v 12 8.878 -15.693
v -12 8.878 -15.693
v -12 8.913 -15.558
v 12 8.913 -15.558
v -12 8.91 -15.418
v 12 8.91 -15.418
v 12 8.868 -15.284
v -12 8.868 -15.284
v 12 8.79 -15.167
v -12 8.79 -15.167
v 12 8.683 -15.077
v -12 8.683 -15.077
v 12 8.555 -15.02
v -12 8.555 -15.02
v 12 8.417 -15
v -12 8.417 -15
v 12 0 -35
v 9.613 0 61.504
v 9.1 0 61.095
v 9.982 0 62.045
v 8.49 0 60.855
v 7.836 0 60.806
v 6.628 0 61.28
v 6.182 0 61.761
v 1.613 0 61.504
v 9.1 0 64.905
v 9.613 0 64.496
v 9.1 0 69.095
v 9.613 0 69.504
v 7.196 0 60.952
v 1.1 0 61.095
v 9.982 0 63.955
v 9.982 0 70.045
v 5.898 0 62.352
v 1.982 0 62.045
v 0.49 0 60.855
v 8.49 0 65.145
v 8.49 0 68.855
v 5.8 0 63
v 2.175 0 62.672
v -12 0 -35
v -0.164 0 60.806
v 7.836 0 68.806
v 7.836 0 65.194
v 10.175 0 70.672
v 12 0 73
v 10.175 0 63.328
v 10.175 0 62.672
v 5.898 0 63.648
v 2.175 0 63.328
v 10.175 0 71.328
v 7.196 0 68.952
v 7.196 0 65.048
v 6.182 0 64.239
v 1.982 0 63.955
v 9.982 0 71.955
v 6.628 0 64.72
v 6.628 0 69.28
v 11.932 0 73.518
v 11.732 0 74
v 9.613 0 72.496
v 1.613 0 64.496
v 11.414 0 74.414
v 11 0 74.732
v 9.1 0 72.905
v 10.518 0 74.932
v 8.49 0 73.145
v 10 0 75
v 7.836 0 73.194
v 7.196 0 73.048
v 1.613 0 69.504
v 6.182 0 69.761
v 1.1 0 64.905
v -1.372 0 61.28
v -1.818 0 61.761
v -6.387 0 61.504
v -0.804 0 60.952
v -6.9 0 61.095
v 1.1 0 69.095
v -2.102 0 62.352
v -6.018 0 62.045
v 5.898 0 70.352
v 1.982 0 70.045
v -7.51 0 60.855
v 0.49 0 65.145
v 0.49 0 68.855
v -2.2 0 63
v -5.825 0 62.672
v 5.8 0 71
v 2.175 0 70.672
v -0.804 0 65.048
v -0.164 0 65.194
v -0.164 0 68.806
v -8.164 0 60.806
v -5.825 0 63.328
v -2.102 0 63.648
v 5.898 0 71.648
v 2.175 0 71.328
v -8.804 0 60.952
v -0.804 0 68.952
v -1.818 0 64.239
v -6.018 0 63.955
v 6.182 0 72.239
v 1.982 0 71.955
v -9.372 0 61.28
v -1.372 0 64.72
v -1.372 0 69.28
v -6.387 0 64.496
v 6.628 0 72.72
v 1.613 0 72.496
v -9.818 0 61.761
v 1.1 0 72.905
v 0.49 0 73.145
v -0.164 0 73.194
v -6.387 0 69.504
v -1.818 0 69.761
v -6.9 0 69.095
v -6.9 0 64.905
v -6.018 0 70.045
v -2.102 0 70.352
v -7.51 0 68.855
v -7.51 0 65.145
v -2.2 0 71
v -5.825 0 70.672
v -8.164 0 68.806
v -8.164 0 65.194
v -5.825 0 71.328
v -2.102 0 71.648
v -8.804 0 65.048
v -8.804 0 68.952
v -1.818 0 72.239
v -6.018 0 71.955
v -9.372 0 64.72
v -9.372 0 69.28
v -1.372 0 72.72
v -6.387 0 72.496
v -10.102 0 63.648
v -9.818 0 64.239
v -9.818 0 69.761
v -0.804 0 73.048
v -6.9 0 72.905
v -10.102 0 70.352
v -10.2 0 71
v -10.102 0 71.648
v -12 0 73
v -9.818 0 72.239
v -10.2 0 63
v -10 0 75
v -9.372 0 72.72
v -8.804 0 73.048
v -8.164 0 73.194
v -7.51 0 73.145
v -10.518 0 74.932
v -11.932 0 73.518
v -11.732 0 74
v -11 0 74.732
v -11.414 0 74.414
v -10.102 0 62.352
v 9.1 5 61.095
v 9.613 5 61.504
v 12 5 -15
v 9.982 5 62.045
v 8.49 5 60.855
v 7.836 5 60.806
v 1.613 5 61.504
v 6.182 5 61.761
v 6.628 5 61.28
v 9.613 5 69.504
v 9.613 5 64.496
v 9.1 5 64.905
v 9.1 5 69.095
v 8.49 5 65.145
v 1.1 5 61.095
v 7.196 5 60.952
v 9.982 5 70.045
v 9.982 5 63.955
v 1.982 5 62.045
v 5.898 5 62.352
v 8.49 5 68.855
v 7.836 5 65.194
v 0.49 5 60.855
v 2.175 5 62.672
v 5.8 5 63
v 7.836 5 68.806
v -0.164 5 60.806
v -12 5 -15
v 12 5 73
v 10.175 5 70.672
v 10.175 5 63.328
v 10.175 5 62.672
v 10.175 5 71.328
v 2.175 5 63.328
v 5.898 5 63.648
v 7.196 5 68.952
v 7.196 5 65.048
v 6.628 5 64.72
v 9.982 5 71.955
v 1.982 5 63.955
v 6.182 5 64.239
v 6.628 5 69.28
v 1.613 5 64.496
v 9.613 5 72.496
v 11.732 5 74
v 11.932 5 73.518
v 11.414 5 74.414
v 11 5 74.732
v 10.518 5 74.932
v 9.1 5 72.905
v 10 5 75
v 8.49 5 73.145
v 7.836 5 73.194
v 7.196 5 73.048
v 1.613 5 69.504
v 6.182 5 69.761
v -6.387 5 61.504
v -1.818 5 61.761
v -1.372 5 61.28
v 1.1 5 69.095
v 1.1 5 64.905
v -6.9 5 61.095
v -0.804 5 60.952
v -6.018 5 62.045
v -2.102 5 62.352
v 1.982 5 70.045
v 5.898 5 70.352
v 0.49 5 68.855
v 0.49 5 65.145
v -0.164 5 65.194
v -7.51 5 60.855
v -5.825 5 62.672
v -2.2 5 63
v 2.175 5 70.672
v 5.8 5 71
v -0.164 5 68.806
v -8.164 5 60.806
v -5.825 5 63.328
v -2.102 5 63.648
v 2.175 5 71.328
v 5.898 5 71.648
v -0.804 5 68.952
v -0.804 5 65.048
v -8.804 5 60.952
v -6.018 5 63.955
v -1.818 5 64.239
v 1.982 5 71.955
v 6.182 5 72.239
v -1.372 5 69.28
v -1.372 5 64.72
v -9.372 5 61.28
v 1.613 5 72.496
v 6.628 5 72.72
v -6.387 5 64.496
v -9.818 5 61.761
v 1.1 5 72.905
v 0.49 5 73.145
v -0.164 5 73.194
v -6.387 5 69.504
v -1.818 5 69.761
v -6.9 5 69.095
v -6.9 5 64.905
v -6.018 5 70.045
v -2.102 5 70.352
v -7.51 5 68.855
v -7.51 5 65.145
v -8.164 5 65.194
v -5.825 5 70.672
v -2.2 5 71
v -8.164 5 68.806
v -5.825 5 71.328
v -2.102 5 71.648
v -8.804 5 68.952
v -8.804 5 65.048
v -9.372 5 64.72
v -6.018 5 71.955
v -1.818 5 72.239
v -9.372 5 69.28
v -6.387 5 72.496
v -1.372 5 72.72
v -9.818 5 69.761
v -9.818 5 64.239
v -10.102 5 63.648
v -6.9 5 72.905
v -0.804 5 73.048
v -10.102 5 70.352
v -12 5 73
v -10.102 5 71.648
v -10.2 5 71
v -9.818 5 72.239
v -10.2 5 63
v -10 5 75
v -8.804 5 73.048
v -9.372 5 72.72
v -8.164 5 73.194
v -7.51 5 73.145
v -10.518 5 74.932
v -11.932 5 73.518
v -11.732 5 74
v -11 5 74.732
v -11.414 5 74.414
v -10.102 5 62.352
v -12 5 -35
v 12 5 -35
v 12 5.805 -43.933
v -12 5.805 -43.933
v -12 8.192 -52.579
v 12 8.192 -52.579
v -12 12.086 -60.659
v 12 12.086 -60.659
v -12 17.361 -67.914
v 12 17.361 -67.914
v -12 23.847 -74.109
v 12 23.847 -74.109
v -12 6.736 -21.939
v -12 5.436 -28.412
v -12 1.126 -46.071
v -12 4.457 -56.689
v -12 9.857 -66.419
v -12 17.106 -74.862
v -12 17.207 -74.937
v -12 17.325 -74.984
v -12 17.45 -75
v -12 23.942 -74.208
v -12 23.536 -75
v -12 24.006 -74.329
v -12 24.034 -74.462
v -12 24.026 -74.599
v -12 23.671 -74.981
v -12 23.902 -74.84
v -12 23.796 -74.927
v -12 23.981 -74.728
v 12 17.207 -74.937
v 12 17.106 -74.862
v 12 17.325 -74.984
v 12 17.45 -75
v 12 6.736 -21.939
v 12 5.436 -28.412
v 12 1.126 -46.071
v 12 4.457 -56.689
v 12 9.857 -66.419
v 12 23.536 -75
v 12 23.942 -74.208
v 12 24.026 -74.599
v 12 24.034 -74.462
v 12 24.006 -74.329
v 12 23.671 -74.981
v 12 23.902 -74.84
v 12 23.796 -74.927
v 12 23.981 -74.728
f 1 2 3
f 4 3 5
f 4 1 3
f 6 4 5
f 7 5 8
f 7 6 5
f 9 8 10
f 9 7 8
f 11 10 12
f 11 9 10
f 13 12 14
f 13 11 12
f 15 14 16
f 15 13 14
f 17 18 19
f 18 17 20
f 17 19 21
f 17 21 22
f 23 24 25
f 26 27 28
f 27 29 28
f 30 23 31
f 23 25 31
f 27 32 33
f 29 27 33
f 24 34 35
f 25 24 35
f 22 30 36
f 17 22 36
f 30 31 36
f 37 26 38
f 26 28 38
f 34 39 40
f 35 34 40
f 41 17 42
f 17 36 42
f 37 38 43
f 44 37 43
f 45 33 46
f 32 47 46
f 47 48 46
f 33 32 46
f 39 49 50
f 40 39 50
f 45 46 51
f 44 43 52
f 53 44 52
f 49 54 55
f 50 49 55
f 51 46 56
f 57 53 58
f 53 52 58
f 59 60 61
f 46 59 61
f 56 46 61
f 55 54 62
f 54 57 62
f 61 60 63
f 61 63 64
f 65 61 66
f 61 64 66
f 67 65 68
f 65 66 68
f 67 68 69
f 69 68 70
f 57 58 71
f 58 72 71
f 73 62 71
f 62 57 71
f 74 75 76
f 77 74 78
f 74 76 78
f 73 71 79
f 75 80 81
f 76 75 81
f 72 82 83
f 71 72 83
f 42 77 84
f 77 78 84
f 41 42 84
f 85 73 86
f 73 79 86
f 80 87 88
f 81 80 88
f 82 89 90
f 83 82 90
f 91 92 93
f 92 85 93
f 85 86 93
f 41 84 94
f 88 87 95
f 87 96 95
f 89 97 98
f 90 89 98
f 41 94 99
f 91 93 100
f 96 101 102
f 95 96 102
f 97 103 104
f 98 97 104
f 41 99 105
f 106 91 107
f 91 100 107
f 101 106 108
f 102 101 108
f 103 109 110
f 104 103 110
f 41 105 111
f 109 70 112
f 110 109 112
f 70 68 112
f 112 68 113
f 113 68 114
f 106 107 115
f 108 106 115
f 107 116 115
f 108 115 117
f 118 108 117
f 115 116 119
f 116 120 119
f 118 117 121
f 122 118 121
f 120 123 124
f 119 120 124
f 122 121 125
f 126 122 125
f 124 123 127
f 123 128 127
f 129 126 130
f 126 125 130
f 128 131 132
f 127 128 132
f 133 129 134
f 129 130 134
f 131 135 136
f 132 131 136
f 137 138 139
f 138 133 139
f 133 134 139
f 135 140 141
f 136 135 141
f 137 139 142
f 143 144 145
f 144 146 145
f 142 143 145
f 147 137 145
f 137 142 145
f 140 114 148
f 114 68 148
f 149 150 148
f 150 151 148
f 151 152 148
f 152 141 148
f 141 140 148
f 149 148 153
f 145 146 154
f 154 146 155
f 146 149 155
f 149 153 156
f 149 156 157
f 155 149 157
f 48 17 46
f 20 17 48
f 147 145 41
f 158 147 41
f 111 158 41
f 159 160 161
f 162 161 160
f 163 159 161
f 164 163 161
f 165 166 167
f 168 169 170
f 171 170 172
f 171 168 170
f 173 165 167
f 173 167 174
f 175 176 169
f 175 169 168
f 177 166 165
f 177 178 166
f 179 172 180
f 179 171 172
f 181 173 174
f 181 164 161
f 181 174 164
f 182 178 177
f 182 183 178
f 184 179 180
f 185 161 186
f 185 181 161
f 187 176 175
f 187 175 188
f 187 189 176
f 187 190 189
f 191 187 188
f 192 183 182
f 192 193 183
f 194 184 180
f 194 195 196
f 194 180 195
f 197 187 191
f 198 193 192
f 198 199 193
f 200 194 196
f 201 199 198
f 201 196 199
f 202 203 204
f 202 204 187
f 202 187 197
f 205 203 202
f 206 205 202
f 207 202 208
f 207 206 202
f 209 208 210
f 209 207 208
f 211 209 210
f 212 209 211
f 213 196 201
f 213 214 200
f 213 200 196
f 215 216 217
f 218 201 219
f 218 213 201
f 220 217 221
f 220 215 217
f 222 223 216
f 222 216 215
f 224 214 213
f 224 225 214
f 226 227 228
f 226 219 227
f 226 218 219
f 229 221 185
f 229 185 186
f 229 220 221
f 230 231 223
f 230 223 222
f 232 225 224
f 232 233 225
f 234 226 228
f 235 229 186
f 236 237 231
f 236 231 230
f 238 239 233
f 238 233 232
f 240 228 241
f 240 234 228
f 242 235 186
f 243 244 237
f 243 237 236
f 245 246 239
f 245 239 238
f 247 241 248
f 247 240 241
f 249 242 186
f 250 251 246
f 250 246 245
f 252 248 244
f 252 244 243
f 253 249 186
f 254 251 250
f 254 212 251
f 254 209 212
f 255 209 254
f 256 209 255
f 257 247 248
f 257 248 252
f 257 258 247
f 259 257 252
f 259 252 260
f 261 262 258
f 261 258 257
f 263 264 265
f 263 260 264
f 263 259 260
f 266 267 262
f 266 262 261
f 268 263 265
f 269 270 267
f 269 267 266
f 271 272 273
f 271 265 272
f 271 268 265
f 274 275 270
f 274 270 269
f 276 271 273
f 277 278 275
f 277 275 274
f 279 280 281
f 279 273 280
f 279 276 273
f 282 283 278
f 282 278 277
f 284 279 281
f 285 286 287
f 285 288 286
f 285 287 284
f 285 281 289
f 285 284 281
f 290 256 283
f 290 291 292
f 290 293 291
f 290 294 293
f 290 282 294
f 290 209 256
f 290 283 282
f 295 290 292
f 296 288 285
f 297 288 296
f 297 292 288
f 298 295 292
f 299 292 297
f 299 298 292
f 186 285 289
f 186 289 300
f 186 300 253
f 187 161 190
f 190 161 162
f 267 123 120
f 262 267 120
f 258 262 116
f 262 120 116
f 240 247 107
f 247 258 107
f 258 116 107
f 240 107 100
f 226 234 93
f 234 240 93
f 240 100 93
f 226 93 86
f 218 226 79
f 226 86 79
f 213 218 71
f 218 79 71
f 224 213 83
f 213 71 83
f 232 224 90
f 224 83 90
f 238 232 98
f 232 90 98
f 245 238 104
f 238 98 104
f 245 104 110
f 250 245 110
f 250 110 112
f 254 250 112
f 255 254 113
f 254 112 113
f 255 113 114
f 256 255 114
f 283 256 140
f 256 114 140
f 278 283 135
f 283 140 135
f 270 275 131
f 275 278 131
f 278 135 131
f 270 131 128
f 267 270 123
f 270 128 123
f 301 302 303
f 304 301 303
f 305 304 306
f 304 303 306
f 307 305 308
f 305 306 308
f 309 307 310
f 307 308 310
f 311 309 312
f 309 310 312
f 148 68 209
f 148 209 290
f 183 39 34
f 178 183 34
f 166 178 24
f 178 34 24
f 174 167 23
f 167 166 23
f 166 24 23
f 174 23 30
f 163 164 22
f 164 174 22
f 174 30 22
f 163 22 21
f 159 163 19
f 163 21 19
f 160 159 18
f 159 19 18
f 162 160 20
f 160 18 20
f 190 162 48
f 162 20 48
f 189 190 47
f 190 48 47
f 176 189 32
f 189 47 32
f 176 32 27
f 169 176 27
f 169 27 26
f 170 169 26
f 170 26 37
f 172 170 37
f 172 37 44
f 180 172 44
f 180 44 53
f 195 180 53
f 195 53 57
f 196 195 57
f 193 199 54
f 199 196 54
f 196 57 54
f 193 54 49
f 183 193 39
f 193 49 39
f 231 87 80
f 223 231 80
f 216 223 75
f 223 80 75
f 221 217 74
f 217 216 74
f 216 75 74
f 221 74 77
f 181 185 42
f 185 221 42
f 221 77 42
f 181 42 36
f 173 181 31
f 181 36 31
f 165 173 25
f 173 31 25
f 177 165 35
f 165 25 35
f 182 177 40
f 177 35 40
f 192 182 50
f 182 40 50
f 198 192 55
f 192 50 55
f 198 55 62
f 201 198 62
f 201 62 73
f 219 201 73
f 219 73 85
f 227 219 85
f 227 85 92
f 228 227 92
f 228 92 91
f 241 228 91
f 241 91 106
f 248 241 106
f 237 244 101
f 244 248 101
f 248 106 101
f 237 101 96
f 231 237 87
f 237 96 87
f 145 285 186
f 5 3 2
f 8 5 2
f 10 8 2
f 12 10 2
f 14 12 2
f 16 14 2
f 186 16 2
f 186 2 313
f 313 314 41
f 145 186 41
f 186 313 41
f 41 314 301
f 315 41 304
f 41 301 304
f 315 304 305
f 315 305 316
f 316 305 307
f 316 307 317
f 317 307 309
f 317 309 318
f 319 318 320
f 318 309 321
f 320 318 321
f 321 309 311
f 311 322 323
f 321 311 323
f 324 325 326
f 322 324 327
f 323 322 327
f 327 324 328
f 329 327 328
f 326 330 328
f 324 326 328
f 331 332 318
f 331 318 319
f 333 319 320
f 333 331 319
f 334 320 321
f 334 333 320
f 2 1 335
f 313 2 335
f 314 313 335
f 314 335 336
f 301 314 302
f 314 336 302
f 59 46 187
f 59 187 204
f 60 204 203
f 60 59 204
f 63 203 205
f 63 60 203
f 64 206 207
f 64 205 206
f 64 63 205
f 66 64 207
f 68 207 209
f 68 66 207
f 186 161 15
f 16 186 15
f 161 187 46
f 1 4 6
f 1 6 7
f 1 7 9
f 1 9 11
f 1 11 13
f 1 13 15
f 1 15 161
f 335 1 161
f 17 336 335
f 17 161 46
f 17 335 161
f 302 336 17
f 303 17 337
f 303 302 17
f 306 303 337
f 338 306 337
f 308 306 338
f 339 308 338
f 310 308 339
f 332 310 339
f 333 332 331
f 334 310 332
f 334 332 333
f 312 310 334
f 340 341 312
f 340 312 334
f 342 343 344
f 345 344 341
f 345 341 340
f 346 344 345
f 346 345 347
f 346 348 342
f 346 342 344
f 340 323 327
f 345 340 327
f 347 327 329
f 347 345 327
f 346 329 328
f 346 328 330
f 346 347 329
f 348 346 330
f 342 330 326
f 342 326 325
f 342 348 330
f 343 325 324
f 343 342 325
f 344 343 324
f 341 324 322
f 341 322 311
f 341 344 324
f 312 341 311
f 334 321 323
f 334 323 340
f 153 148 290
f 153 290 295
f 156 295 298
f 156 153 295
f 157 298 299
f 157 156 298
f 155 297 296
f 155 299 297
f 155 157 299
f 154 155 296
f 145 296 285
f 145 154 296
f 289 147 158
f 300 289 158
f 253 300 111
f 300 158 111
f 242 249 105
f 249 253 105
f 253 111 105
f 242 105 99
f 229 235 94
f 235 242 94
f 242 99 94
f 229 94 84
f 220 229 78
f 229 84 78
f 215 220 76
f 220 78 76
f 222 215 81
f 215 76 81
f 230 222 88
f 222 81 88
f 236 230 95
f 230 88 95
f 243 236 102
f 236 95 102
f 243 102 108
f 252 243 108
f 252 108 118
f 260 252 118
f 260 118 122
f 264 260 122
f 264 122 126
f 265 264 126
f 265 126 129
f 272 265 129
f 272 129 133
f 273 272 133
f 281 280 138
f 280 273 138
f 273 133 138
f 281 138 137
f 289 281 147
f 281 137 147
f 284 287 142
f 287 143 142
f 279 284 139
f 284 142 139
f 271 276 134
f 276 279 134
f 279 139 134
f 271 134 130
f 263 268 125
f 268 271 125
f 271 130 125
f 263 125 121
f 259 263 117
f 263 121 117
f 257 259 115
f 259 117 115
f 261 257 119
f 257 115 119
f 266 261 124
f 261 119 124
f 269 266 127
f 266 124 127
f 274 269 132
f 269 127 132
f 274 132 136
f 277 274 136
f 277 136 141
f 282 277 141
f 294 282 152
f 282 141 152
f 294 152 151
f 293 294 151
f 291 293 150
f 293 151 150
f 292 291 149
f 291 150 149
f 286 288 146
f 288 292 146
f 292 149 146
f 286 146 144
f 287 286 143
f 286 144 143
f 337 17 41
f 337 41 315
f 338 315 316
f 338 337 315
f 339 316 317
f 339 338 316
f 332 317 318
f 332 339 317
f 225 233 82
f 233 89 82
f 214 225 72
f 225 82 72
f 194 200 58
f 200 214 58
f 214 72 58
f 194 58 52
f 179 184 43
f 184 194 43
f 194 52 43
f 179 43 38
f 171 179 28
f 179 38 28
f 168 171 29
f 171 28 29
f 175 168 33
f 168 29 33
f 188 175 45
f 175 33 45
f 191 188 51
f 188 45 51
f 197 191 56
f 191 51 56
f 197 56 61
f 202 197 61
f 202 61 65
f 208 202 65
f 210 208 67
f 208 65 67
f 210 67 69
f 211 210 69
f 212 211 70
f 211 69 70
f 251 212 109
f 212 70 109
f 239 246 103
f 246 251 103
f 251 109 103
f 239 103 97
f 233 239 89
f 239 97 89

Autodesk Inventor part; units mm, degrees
ref_plane "YZ Plane" through (0, 0, 0) normal (1, 0, 0) x (0, 1, 0)
ref_plane "XZ Plane" through (0, 0, 0) normal (0, 1, 0) x (-1, 0, 0)
ref_plane "XY Plane" through (0, 0, 0) normal (0, 0, 1) x (1, 0, 0)
sketch "Sketch1" plane through (0, 0, 0) normal (0, 1, 0) x (-1, 0, 0)
  line L0 (-10, 75) -> (10, 75)
  line L1 (12, 73) -> (12, -75)
  line L2 (12, -75) -> (-12, -75)
  line L3 (-12, -75) -> (-12, 73)
  line L4 (-12, 75) -> (12, -75) construction
  line L5 (12, 75) -> (-12, -75) construction
  arc A0 (12, 73) -> (10, 75) centre (10, 73) ccw
  arc A1 (-10, 75) -> (-12, 73) centre (-10, 73) ccw
  circle A2 centre (8, 71) radius 2.2
  circle A3 centre (0, 71) radius 2.2
  circle A4 centre (-8, 71) radius 2.2
  circle A5 centre (8, 63) radius 2.2
  circle A6 centre (0, 63) radius 2.2
  circle A7 centre (-8, 63) radius 2.2
  point P0 (0, 0)
  dimension "d0" = 24
  dimension "d1" = 150
  dimension "d2" = 2
  dimension "d3" = 4.4
  dimension "d4" = 4
  dimension "d5" = 4
  dimension "d8" = 8
  dimension "d11" = 8
extrude "Extrusion1" add sketch "Sketch1" along normal blind 5
sketch "Sketch2" plane through (12, 0, 73) normal (1, 0, 0) x (0, 0, -1)
  arc A0 (108, 5) -> (147.1089, 23.8473) centre (108, 55) ccw
  line L0 (0, 5) -> (148, 5) projected
  line L1 (148, 5) -> (148, 23.5357)
  arc A1 (148, 23.5357) -> (147.1089, 23.8473) centre (147.5, 23.5357) ccw
  point P0 (73, 0)
  point P1 (148, 25)
  dimension "d16" = 100
  dimension "d17" = 40
  dimension "d18" = 0.5
extrude "Extrusion2" add sketch "Sketch2" against normal blind 24
sketch "Sketch3" plane through (12, 0, 73) normal (1, 0, 0) x (0, 0, -1)
  line L0 (0, 0) -> (148, 0) projected
  arc A0 (108, 5) -> (147.1089, 23.8473) centre (108, 55) ccw projected
  line L1 (0, 5) -> (108, 5) projected
  arc A1 (108, 0) -> (147.8624, 17.1055) centre (108, 55) ccw
  line L2 (148, 0) -> (148, 23.5357) projected
  line L3 (148, 17.2508) -> (148, 0)
  line L4 (148, 0) -> (108, 0)
  arc A2 (147.8624, 17.1055) -> (148, 17.45) centre (147.5, 17.45) ccw
  point P0 (150, 0)
  dimension "d27" = 1
  dimension "d28" = 17.2508
extrude "Extrusion3" cut sketch "Sketch3" against normal blind 24
sketch "Sketch4" plane through (12, 0, 73) normal (1, 0, 0) x (0, 0, -1)
  arc A0 (88.6931, 8.878) -> (108, 5) centre (108, 55) ccw
  line L0 (0, 5) -> (108, 5) projected
  line L1 (148, 17.45) -> (148, 23.5357) projected
  line L2 (88, 5) -> (88, 8.4167)
  arc A1 (88.6931, 8.878) -> (88, 8.4167) centre (88.5, 8.4167) ccw
  point P0 (73, 0)
  point P1 (88, 9.1742)
  dimension "d31" = 0.5
  dimension "d40" = 20
  dimension "d41" = 50
extrude "Extrusion4" add sketch "Sketch4" against normal blind 24
properties part number "Launcher_Arm_V2"
